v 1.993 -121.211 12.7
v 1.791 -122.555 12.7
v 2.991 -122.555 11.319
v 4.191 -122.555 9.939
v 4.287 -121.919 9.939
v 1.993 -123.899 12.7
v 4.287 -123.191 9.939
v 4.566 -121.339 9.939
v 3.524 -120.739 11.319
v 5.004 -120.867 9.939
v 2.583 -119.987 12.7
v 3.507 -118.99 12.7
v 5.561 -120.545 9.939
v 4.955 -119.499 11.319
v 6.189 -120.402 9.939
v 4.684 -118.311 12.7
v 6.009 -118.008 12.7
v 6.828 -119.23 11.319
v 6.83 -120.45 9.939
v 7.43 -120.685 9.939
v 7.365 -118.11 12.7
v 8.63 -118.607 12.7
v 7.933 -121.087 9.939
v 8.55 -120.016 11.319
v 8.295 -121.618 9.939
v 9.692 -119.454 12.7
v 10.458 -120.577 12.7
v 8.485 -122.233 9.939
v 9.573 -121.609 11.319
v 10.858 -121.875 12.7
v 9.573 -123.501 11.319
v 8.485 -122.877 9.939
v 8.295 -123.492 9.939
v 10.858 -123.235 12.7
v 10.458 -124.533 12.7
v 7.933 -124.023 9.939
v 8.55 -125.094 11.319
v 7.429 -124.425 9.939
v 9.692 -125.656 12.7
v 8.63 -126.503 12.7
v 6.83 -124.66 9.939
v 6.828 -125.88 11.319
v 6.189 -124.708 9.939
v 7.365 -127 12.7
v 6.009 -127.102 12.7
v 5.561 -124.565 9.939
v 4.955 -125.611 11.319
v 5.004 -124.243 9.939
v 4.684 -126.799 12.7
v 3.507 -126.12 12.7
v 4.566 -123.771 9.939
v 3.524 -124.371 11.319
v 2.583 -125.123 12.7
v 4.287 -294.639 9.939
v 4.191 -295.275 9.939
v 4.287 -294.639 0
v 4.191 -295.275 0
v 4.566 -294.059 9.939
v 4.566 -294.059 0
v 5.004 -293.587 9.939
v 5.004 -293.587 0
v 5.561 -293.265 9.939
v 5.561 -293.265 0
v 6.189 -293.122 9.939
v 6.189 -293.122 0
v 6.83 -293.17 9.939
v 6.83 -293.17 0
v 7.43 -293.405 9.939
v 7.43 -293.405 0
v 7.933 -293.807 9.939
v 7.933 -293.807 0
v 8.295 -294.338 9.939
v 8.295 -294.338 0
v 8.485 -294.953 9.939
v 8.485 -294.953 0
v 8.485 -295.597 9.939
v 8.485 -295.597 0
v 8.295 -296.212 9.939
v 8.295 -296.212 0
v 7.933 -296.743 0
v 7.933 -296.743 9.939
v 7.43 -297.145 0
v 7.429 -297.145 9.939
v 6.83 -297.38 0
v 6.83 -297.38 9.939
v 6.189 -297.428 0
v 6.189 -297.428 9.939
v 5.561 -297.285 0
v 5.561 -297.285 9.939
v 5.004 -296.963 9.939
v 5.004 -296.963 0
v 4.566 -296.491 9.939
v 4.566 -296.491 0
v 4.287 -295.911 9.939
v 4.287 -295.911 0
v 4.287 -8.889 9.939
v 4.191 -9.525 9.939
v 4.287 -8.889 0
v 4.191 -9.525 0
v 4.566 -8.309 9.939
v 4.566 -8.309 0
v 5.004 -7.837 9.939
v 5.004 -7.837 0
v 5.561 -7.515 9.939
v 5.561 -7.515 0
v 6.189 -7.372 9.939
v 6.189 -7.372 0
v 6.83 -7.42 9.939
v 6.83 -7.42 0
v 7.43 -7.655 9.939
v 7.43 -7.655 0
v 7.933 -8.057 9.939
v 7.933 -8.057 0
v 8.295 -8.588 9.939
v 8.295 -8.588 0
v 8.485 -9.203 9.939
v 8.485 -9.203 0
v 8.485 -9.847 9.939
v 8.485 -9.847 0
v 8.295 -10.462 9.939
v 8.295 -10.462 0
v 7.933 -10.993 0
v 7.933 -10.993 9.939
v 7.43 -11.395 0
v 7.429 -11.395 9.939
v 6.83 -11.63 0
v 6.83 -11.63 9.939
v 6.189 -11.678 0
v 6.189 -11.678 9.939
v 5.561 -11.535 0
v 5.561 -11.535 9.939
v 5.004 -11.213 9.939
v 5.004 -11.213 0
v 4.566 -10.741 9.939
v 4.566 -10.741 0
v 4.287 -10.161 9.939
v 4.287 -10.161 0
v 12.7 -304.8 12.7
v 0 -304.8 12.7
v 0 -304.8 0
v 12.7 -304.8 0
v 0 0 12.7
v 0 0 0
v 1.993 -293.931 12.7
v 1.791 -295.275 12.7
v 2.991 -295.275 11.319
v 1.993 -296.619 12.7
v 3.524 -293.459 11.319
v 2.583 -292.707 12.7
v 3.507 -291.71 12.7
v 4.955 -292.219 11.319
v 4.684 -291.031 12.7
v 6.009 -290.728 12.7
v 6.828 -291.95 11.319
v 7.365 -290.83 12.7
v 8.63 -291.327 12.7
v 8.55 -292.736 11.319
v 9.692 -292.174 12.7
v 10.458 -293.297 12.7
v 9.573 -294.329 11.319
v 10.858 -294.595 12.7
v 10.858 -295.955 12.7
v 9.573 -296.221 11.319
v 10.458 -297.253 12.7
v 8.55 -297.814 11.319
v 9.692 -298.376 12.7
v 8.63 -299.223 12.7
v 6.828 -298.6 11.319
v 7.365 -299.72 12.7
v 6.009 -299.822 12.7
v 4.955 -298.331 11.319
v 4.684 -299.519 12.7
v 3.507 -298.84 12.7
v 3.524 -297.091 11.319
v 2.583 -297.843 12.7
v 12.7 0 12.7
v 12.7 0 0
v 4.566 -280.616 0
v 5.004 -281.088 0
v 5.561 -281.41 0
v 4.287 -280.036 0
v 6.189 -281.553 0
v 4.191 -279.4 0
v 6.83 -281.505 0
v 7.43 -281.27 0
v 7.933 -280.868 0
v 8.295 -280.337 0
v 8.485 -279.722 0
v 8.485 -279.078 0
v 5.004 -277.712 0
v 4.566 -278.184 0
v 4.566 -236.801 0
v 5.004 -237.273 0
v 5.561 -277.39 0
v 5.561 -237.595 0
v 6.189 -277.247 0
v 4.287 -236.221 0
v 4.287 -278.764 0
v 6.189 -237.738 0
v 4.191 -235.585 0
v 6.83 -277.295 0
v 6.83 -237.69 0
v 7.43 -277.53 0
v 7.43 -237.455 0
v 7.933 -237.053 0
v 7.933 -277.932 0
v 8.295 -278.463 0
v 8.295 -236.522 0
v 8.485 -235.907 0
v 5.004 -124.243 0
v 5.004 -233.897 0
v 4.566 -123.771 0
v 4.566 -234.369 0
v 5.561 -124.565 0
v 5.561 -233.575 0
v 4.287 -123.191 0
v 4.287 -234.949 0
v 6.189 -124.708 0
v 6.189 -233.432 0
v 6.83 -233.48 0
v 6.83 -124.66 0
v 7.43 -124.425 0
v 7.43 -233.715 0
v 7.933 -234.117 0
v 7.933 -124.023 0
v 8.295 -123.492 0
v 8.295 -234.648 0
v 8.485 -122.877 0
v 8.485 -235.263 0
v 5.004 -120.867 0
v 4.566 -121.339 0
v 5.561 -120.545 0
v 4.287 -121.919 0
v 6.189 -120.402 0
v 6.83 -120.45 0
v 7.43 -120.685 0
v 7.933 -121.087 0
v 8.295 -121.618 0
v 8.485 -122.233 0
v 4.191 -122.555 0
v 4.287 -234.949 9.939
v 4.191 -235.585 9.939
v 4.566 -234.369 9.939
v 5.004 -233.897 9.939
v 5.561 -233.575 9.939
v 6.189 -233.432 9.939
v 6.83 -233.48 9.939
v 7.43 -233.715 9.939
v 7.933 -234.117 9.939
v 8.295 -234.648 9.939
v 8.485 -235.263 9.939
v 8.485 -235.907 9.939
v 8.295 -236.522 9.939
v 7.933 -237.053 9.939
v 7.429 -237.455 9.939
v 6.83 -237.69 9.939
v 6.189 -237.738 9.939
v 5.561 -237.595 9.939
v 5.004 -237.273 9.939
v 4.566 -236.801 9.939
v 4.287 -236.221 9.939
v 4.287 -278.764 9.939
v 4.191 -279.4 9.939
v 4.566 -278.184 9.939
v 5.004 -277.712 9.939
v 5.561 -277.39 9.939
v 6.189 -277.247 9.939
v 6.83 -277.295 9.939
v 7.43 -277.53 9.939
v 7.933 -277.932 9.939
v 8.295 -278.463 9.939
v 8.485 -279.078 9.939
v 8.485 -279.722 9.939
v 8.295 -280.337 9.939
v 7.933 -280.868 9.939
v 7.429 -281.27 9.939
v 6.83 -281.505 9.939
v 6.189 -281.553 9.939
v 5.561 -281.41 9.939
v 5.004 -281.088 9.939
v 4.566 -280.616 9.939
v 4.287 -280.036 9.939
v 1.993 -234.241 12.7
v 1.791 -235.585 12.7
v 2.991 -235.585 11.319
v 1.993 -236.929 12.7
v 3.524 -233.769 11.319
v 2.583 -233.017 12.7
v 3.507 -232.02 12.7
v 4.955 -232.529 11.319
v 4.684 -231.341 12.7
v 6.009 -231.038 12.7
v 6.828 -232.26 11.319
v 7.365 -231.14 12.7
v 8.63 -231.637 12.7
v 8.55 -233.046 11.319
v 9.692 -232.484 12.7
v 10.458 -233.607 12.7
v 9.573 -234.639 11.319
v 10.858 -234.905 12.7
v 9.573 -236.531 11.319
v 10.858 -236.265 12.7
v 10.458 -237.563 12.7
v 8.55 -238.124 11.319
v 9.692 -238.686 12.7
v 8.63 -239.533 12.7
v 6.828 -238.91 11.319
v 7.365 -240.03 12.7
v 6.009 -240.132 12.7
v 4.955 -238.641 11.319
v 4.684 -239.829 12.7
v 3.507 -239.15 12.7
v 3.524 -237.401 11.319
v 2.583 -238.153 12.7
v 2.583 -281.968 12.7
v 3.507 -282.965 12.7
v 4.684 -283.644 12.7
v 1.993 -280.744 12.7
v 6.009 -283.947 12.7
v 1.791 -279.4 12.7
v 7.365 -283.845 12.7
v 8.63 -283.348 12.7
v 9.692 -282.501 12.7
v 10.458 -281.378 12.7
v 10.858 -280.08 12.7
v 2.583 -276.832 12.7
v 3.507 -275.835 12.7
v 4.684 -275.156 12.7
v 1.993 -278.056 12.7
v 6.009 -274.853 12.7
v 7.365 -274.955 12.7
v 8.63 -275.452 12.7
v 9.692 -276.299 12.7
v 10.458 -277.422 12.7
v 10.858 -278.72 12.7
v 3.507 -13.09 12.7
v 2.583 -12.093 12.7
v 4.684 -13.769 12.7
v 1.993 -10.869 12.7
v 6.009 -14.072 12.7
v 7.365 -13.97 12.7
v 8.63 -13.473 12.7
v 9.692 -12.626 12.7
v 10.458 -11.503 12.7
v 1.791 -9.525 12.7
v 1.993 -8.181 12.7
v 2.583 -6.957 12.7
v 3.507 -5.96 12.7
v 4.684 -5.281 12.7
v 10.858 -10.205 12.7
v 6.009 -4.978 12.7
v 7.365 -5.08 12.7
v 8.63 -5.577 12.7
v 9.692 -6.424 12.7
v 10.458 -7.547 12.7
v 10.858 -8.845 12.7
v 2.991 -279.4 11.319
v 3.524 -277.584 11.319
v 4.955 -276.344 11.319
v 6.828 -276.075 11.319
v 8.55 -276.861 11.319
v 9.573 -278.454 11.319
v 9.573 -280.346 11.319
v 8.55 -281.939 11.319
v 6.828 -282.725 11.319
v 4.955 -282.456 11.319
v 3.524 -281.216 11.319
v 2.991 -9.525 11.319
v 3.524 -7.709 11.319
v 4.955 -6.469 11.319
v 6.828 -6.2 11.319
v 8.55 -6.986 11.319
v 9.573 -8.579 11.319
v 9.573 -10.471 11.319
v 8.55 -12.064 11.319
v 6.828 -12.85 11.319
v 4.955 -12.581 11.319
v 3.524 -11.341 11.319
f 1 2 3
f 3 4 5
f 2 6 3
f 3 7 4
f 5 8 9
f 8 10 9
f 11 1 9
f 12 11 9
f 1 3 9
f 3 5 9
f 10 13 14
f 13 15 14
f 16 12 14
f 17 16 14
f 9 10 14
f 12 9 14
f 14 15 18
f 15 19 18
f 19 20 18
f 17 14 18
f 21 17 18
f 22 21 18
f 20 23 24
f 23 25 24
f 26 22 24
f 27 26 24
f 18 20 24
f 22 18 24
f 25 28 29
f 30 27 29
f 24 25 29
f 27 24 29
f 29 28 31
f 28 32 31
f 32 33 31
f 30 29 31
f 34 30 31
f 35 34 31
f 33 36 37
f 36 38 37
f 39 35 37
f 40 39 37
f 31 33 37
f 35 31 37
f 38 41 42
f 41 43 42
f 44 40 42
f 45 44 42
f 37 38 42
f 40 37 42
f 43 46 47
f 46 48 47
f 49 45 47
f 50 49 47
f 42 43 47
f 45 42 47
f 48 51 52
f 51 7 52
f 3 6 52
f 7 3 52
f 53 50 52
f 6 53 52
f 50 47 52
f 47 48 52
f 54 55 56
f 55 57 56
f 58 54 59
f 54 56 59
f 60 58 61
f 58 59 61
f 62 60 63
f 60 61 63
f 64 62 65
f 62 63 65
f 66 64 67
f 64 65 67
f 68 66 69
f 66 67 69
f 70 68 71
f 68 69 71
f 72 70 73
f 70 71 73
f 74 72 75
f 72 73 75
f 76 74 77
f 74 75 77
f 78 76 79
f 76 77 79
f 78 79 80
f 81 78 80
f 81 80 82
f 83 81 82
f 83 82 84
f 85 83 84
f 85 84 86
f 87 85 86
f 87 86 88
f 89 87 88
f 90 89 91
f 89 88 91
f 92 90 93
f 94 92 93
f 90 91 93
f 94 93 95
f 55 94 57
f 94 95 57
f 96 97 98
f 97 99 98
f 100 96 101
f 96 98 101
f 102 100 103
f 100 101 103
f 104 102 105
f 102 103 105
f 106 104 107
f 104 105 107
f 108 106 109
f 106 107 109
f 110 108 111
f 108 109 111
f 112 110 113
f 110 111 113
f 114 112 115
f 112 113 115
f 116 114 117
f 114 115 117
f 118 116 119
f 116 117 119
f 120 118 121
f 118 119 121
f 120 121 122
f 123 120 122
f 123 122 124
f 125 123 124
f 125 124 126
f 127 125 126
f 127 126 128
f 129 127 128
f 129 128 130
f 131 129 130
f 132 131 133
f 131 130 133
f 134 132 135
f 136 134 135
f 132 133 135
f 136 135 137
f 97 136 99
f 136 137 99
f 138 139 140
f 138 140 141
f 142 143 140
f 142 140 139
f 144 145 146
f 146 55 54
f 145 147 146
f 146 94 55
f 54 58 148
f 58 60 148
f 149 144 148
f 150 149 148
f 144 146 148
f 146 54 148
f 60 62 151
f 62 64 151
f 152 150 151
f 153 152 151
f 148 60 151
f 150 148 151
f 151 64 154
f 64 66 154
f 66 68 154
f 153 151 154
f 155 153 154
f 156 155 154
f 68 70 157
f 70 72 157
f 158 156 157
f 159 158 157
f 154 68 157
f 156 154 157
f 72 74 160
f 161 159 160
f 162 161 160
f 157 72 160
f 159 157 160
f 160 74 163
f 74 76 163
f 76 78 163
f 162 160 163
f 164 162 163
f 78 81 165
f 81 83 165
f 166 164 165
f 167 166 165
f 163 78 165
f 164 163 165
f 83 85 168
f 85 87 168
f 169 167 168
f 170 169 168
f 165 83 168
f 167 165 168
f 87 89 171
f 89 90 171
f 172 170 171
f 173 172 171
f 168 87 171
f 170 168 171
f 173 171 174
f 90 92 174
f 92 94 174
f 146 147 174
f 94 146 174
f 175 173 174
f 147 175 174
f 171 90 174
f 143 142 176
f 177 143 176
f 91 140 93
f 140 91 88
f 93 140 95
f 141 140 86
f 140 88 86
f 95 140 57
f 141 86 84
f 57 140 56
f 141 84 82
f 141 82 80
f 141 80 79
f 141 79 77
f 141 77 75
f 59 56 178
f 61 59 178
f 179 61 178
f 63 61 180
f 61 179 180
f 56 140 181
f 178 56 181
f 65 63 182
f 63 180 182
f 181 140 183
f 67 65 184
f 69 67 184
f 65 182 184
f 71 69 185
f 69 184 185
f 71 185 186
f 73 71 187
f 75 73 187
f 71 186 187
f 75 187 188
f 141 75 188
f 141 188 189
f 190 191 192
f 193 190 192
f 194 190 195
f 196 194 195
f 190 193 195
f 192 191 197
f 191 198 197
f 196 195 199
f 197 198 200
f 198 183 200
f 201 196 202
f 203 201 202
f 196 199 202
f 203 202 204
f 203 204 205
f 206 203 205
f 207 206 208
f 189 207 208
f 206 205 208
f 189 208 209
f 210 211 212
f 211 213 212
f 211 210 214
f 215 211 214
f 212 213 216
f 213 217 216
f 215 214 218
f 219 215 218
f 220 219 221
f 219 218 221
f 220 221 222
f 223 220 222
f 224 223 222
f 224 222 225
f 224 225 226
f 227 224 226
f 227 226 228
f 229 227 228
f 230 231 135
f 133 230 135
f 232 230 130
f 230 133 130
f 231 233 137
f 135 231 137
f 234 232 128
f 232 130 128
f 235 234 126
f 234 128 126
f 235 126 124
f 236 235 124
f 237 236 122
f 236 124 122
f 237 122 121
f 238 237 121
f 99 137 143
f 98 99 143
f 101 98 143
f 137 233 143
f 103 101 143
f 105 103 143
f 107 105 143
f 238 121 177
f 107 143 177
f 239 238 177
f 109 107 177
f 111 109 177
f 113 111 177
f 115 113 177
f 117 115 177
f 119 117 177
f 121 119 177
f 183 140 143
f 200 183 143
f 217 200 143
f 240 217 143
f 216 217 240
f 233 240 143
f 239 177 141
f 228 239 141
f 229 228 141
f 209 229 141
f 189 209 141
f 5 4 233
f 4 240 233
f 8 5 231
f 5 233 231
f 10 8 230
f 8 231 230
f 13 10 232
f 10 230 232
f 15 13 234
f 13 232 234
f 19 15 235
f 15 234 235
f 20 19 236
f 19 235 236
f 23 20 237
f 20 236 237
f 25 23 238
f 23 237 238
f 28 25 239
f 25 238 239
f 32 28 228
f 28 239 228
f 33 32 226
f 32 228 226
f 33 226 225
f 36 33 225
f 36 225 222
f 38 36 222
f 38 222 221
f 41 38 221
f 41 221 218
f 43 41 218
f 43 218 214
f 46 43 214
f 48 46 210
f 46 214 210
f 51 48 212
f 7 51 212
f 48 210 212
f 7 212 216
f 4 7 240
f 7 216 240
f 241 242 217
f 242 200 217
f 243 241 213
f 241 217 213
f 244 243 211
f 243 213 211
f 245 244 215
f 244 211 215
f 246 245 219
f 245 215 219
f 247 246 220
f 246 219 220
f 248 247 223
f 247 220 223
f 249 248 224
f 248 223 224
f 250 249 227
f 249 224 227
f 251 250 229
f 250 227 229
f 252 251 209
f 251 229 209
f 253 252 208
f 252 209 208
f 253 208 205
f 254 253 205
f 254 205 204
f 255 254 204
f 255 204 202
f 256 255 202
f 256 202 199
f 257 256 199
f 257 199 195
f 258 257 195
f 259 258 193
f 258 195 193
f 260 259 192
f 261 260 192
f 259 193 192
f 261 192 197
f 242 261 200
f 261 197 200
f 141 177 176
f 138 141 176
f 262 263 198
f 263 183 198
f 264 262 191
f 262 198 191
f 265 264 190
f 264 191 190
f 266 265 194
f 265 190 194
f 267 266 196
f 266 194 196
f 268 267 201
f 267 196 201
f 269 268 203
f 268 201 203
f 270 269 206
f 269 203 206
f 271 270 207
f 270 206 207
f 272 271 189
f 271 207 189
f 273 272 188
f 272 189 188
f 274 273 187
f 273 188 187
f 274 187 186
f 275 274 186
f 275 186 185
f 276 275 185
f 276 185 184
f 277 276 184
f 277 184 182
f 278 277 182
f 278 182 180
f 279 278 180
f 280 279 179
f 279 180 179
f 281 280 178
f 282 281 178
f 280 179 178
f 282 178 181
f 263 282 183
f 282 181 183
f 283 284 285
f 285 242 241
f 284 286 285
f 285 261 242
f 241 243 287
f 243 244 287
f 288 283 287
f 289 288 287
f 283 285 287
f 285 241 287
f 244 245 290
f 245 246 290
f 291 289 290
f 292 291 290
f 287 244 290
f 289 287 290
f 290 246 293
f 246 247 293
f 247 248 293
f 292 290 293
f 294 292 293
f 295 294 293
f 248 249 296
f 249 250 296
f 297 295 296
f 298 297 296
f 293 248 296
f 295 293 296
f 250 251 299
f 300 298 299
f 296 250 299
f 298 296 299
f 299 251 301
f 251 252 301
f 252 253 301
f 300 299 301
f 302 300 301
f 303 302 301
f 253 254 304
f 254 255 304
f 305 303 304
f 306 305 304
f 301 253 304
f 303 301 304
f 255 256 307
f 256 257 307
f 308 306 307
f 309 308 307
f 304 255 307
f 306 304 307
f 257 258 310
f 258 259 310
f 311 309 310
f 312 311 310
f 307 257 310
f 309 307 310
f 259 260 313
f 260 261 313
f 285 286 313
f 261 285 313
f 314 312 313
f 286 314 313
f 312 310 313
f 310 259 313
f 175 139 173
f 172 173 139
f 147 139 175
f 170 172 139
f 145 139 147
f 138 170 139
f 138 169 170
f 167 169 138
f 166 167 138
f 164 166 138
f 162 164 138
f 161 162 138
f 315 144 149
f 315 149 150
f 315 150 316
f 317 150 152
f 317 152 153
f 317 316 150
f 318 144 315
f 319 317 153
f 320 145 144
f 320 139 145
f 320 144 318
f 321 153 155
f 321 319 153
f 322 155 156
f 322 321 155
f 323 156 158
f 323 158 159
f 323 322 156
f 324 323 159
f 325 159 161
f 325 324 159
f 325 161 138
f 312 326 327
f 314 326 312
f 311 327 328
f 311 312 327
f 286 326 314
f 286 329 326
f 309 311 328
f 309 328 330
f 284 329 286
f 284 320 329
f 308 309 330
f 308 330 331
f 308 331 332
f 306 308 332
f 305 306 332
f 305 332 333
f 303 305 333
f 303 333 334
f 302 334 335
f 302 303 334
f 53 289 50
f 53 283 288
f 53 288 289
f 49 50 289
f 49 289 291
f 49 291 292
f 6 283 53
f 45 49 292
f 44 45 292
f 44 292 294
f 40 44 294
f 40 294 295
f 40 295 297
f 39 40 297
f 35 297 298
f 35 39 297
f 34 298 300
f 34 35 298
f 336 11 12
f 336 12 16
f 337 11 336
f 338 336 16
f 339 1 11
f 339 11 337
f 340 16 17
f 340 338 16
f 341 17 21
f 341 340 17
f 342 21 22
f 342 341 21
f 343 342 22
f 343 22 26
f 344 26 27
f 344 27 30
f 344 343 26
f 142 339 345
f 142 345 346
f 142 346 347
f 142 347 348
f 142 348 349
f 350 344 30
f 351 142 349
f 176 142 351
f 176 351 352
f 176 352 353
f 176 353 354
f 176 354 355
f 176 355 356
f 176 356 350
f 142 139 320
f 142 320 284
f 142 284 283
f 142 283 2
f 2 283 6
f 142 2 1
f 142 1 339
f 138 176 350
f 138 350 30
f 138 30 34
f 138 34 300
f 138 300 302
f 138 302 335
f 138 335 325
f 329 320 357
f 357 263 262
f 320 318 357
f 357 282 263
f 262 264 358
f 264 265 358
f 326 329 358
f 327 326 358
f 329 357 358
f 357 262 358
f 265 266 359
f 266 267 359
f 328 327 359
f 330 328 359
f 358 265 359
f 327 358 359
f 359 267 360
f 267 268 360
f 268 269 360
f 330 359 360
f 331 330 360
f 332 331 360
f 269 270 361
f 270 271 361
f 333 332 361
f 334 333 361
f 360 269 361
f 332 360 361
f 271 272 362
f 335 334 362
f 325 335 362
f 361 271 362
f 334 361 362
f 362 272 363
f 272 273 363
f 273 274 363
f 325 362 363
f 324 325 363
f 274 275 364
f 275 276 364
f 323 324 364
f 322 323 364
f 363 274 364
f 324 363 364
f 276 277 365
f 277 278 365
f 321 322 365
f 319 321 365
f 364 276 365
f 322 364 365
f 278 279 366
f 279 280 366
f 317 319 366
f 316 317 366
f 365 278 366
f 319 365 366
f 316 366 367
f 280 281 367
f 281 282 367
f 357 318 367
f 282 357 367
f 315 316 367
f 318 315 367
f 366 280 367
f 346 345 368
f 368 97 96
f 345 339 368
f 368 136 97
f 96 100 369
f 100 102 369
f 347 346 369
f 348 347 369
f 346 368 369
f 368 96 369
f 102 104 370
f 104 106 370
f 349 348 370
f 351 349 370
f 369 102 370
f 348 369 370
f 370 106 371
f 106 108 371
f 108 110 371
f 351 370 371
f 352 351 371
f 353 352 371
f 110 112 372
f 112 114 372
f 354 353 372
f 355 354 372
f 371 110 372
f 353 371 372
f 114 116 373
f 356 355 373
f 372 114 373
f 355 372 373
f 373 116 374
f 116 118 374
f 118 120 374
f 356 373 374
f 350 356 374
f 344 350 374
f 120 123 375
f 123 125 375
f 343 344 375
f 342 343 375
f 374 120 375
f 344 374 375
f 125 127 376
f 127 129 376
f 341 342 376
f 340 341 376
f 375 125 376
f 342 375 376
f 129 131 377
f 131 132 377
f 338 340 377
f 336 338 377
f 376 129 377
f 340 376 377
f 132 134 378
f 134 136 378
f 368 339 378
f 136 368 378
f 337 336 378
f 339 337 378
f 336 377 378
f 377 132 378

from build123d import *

# Parameters (mm, degrees)
F0_W           = 12.7
F0_H           = 12.7
F1_DEPTH       = 304.8
F3_D           = 4.318
F3_CSINK_D     = 9.1186
F3_CSINK_ANGLE = 82


with BuildPart() as f1:
    # F0 (on Front) → F1 (new body)
    with BuildSketch(Plane.XZ):
        with Locations((6.35, 6.35)):
            Rectangle(F0_W, F0_H)
    extrude(amount=F1_DEPTH)

    # F3 (through all)
    with Locations(Plane.XY.offset(12.7)):
        with Locations((6.35, -9.525), (6.35, -122.555), (6.35, -235.585), (6.35, -279.4), (6.35, -295.275)):
            CounterSinkHole(F3_D / 2, F3_CSINK_D / 2, counter_sink_angle=F3_CSINK_ANGLE)


solid = f1.part
